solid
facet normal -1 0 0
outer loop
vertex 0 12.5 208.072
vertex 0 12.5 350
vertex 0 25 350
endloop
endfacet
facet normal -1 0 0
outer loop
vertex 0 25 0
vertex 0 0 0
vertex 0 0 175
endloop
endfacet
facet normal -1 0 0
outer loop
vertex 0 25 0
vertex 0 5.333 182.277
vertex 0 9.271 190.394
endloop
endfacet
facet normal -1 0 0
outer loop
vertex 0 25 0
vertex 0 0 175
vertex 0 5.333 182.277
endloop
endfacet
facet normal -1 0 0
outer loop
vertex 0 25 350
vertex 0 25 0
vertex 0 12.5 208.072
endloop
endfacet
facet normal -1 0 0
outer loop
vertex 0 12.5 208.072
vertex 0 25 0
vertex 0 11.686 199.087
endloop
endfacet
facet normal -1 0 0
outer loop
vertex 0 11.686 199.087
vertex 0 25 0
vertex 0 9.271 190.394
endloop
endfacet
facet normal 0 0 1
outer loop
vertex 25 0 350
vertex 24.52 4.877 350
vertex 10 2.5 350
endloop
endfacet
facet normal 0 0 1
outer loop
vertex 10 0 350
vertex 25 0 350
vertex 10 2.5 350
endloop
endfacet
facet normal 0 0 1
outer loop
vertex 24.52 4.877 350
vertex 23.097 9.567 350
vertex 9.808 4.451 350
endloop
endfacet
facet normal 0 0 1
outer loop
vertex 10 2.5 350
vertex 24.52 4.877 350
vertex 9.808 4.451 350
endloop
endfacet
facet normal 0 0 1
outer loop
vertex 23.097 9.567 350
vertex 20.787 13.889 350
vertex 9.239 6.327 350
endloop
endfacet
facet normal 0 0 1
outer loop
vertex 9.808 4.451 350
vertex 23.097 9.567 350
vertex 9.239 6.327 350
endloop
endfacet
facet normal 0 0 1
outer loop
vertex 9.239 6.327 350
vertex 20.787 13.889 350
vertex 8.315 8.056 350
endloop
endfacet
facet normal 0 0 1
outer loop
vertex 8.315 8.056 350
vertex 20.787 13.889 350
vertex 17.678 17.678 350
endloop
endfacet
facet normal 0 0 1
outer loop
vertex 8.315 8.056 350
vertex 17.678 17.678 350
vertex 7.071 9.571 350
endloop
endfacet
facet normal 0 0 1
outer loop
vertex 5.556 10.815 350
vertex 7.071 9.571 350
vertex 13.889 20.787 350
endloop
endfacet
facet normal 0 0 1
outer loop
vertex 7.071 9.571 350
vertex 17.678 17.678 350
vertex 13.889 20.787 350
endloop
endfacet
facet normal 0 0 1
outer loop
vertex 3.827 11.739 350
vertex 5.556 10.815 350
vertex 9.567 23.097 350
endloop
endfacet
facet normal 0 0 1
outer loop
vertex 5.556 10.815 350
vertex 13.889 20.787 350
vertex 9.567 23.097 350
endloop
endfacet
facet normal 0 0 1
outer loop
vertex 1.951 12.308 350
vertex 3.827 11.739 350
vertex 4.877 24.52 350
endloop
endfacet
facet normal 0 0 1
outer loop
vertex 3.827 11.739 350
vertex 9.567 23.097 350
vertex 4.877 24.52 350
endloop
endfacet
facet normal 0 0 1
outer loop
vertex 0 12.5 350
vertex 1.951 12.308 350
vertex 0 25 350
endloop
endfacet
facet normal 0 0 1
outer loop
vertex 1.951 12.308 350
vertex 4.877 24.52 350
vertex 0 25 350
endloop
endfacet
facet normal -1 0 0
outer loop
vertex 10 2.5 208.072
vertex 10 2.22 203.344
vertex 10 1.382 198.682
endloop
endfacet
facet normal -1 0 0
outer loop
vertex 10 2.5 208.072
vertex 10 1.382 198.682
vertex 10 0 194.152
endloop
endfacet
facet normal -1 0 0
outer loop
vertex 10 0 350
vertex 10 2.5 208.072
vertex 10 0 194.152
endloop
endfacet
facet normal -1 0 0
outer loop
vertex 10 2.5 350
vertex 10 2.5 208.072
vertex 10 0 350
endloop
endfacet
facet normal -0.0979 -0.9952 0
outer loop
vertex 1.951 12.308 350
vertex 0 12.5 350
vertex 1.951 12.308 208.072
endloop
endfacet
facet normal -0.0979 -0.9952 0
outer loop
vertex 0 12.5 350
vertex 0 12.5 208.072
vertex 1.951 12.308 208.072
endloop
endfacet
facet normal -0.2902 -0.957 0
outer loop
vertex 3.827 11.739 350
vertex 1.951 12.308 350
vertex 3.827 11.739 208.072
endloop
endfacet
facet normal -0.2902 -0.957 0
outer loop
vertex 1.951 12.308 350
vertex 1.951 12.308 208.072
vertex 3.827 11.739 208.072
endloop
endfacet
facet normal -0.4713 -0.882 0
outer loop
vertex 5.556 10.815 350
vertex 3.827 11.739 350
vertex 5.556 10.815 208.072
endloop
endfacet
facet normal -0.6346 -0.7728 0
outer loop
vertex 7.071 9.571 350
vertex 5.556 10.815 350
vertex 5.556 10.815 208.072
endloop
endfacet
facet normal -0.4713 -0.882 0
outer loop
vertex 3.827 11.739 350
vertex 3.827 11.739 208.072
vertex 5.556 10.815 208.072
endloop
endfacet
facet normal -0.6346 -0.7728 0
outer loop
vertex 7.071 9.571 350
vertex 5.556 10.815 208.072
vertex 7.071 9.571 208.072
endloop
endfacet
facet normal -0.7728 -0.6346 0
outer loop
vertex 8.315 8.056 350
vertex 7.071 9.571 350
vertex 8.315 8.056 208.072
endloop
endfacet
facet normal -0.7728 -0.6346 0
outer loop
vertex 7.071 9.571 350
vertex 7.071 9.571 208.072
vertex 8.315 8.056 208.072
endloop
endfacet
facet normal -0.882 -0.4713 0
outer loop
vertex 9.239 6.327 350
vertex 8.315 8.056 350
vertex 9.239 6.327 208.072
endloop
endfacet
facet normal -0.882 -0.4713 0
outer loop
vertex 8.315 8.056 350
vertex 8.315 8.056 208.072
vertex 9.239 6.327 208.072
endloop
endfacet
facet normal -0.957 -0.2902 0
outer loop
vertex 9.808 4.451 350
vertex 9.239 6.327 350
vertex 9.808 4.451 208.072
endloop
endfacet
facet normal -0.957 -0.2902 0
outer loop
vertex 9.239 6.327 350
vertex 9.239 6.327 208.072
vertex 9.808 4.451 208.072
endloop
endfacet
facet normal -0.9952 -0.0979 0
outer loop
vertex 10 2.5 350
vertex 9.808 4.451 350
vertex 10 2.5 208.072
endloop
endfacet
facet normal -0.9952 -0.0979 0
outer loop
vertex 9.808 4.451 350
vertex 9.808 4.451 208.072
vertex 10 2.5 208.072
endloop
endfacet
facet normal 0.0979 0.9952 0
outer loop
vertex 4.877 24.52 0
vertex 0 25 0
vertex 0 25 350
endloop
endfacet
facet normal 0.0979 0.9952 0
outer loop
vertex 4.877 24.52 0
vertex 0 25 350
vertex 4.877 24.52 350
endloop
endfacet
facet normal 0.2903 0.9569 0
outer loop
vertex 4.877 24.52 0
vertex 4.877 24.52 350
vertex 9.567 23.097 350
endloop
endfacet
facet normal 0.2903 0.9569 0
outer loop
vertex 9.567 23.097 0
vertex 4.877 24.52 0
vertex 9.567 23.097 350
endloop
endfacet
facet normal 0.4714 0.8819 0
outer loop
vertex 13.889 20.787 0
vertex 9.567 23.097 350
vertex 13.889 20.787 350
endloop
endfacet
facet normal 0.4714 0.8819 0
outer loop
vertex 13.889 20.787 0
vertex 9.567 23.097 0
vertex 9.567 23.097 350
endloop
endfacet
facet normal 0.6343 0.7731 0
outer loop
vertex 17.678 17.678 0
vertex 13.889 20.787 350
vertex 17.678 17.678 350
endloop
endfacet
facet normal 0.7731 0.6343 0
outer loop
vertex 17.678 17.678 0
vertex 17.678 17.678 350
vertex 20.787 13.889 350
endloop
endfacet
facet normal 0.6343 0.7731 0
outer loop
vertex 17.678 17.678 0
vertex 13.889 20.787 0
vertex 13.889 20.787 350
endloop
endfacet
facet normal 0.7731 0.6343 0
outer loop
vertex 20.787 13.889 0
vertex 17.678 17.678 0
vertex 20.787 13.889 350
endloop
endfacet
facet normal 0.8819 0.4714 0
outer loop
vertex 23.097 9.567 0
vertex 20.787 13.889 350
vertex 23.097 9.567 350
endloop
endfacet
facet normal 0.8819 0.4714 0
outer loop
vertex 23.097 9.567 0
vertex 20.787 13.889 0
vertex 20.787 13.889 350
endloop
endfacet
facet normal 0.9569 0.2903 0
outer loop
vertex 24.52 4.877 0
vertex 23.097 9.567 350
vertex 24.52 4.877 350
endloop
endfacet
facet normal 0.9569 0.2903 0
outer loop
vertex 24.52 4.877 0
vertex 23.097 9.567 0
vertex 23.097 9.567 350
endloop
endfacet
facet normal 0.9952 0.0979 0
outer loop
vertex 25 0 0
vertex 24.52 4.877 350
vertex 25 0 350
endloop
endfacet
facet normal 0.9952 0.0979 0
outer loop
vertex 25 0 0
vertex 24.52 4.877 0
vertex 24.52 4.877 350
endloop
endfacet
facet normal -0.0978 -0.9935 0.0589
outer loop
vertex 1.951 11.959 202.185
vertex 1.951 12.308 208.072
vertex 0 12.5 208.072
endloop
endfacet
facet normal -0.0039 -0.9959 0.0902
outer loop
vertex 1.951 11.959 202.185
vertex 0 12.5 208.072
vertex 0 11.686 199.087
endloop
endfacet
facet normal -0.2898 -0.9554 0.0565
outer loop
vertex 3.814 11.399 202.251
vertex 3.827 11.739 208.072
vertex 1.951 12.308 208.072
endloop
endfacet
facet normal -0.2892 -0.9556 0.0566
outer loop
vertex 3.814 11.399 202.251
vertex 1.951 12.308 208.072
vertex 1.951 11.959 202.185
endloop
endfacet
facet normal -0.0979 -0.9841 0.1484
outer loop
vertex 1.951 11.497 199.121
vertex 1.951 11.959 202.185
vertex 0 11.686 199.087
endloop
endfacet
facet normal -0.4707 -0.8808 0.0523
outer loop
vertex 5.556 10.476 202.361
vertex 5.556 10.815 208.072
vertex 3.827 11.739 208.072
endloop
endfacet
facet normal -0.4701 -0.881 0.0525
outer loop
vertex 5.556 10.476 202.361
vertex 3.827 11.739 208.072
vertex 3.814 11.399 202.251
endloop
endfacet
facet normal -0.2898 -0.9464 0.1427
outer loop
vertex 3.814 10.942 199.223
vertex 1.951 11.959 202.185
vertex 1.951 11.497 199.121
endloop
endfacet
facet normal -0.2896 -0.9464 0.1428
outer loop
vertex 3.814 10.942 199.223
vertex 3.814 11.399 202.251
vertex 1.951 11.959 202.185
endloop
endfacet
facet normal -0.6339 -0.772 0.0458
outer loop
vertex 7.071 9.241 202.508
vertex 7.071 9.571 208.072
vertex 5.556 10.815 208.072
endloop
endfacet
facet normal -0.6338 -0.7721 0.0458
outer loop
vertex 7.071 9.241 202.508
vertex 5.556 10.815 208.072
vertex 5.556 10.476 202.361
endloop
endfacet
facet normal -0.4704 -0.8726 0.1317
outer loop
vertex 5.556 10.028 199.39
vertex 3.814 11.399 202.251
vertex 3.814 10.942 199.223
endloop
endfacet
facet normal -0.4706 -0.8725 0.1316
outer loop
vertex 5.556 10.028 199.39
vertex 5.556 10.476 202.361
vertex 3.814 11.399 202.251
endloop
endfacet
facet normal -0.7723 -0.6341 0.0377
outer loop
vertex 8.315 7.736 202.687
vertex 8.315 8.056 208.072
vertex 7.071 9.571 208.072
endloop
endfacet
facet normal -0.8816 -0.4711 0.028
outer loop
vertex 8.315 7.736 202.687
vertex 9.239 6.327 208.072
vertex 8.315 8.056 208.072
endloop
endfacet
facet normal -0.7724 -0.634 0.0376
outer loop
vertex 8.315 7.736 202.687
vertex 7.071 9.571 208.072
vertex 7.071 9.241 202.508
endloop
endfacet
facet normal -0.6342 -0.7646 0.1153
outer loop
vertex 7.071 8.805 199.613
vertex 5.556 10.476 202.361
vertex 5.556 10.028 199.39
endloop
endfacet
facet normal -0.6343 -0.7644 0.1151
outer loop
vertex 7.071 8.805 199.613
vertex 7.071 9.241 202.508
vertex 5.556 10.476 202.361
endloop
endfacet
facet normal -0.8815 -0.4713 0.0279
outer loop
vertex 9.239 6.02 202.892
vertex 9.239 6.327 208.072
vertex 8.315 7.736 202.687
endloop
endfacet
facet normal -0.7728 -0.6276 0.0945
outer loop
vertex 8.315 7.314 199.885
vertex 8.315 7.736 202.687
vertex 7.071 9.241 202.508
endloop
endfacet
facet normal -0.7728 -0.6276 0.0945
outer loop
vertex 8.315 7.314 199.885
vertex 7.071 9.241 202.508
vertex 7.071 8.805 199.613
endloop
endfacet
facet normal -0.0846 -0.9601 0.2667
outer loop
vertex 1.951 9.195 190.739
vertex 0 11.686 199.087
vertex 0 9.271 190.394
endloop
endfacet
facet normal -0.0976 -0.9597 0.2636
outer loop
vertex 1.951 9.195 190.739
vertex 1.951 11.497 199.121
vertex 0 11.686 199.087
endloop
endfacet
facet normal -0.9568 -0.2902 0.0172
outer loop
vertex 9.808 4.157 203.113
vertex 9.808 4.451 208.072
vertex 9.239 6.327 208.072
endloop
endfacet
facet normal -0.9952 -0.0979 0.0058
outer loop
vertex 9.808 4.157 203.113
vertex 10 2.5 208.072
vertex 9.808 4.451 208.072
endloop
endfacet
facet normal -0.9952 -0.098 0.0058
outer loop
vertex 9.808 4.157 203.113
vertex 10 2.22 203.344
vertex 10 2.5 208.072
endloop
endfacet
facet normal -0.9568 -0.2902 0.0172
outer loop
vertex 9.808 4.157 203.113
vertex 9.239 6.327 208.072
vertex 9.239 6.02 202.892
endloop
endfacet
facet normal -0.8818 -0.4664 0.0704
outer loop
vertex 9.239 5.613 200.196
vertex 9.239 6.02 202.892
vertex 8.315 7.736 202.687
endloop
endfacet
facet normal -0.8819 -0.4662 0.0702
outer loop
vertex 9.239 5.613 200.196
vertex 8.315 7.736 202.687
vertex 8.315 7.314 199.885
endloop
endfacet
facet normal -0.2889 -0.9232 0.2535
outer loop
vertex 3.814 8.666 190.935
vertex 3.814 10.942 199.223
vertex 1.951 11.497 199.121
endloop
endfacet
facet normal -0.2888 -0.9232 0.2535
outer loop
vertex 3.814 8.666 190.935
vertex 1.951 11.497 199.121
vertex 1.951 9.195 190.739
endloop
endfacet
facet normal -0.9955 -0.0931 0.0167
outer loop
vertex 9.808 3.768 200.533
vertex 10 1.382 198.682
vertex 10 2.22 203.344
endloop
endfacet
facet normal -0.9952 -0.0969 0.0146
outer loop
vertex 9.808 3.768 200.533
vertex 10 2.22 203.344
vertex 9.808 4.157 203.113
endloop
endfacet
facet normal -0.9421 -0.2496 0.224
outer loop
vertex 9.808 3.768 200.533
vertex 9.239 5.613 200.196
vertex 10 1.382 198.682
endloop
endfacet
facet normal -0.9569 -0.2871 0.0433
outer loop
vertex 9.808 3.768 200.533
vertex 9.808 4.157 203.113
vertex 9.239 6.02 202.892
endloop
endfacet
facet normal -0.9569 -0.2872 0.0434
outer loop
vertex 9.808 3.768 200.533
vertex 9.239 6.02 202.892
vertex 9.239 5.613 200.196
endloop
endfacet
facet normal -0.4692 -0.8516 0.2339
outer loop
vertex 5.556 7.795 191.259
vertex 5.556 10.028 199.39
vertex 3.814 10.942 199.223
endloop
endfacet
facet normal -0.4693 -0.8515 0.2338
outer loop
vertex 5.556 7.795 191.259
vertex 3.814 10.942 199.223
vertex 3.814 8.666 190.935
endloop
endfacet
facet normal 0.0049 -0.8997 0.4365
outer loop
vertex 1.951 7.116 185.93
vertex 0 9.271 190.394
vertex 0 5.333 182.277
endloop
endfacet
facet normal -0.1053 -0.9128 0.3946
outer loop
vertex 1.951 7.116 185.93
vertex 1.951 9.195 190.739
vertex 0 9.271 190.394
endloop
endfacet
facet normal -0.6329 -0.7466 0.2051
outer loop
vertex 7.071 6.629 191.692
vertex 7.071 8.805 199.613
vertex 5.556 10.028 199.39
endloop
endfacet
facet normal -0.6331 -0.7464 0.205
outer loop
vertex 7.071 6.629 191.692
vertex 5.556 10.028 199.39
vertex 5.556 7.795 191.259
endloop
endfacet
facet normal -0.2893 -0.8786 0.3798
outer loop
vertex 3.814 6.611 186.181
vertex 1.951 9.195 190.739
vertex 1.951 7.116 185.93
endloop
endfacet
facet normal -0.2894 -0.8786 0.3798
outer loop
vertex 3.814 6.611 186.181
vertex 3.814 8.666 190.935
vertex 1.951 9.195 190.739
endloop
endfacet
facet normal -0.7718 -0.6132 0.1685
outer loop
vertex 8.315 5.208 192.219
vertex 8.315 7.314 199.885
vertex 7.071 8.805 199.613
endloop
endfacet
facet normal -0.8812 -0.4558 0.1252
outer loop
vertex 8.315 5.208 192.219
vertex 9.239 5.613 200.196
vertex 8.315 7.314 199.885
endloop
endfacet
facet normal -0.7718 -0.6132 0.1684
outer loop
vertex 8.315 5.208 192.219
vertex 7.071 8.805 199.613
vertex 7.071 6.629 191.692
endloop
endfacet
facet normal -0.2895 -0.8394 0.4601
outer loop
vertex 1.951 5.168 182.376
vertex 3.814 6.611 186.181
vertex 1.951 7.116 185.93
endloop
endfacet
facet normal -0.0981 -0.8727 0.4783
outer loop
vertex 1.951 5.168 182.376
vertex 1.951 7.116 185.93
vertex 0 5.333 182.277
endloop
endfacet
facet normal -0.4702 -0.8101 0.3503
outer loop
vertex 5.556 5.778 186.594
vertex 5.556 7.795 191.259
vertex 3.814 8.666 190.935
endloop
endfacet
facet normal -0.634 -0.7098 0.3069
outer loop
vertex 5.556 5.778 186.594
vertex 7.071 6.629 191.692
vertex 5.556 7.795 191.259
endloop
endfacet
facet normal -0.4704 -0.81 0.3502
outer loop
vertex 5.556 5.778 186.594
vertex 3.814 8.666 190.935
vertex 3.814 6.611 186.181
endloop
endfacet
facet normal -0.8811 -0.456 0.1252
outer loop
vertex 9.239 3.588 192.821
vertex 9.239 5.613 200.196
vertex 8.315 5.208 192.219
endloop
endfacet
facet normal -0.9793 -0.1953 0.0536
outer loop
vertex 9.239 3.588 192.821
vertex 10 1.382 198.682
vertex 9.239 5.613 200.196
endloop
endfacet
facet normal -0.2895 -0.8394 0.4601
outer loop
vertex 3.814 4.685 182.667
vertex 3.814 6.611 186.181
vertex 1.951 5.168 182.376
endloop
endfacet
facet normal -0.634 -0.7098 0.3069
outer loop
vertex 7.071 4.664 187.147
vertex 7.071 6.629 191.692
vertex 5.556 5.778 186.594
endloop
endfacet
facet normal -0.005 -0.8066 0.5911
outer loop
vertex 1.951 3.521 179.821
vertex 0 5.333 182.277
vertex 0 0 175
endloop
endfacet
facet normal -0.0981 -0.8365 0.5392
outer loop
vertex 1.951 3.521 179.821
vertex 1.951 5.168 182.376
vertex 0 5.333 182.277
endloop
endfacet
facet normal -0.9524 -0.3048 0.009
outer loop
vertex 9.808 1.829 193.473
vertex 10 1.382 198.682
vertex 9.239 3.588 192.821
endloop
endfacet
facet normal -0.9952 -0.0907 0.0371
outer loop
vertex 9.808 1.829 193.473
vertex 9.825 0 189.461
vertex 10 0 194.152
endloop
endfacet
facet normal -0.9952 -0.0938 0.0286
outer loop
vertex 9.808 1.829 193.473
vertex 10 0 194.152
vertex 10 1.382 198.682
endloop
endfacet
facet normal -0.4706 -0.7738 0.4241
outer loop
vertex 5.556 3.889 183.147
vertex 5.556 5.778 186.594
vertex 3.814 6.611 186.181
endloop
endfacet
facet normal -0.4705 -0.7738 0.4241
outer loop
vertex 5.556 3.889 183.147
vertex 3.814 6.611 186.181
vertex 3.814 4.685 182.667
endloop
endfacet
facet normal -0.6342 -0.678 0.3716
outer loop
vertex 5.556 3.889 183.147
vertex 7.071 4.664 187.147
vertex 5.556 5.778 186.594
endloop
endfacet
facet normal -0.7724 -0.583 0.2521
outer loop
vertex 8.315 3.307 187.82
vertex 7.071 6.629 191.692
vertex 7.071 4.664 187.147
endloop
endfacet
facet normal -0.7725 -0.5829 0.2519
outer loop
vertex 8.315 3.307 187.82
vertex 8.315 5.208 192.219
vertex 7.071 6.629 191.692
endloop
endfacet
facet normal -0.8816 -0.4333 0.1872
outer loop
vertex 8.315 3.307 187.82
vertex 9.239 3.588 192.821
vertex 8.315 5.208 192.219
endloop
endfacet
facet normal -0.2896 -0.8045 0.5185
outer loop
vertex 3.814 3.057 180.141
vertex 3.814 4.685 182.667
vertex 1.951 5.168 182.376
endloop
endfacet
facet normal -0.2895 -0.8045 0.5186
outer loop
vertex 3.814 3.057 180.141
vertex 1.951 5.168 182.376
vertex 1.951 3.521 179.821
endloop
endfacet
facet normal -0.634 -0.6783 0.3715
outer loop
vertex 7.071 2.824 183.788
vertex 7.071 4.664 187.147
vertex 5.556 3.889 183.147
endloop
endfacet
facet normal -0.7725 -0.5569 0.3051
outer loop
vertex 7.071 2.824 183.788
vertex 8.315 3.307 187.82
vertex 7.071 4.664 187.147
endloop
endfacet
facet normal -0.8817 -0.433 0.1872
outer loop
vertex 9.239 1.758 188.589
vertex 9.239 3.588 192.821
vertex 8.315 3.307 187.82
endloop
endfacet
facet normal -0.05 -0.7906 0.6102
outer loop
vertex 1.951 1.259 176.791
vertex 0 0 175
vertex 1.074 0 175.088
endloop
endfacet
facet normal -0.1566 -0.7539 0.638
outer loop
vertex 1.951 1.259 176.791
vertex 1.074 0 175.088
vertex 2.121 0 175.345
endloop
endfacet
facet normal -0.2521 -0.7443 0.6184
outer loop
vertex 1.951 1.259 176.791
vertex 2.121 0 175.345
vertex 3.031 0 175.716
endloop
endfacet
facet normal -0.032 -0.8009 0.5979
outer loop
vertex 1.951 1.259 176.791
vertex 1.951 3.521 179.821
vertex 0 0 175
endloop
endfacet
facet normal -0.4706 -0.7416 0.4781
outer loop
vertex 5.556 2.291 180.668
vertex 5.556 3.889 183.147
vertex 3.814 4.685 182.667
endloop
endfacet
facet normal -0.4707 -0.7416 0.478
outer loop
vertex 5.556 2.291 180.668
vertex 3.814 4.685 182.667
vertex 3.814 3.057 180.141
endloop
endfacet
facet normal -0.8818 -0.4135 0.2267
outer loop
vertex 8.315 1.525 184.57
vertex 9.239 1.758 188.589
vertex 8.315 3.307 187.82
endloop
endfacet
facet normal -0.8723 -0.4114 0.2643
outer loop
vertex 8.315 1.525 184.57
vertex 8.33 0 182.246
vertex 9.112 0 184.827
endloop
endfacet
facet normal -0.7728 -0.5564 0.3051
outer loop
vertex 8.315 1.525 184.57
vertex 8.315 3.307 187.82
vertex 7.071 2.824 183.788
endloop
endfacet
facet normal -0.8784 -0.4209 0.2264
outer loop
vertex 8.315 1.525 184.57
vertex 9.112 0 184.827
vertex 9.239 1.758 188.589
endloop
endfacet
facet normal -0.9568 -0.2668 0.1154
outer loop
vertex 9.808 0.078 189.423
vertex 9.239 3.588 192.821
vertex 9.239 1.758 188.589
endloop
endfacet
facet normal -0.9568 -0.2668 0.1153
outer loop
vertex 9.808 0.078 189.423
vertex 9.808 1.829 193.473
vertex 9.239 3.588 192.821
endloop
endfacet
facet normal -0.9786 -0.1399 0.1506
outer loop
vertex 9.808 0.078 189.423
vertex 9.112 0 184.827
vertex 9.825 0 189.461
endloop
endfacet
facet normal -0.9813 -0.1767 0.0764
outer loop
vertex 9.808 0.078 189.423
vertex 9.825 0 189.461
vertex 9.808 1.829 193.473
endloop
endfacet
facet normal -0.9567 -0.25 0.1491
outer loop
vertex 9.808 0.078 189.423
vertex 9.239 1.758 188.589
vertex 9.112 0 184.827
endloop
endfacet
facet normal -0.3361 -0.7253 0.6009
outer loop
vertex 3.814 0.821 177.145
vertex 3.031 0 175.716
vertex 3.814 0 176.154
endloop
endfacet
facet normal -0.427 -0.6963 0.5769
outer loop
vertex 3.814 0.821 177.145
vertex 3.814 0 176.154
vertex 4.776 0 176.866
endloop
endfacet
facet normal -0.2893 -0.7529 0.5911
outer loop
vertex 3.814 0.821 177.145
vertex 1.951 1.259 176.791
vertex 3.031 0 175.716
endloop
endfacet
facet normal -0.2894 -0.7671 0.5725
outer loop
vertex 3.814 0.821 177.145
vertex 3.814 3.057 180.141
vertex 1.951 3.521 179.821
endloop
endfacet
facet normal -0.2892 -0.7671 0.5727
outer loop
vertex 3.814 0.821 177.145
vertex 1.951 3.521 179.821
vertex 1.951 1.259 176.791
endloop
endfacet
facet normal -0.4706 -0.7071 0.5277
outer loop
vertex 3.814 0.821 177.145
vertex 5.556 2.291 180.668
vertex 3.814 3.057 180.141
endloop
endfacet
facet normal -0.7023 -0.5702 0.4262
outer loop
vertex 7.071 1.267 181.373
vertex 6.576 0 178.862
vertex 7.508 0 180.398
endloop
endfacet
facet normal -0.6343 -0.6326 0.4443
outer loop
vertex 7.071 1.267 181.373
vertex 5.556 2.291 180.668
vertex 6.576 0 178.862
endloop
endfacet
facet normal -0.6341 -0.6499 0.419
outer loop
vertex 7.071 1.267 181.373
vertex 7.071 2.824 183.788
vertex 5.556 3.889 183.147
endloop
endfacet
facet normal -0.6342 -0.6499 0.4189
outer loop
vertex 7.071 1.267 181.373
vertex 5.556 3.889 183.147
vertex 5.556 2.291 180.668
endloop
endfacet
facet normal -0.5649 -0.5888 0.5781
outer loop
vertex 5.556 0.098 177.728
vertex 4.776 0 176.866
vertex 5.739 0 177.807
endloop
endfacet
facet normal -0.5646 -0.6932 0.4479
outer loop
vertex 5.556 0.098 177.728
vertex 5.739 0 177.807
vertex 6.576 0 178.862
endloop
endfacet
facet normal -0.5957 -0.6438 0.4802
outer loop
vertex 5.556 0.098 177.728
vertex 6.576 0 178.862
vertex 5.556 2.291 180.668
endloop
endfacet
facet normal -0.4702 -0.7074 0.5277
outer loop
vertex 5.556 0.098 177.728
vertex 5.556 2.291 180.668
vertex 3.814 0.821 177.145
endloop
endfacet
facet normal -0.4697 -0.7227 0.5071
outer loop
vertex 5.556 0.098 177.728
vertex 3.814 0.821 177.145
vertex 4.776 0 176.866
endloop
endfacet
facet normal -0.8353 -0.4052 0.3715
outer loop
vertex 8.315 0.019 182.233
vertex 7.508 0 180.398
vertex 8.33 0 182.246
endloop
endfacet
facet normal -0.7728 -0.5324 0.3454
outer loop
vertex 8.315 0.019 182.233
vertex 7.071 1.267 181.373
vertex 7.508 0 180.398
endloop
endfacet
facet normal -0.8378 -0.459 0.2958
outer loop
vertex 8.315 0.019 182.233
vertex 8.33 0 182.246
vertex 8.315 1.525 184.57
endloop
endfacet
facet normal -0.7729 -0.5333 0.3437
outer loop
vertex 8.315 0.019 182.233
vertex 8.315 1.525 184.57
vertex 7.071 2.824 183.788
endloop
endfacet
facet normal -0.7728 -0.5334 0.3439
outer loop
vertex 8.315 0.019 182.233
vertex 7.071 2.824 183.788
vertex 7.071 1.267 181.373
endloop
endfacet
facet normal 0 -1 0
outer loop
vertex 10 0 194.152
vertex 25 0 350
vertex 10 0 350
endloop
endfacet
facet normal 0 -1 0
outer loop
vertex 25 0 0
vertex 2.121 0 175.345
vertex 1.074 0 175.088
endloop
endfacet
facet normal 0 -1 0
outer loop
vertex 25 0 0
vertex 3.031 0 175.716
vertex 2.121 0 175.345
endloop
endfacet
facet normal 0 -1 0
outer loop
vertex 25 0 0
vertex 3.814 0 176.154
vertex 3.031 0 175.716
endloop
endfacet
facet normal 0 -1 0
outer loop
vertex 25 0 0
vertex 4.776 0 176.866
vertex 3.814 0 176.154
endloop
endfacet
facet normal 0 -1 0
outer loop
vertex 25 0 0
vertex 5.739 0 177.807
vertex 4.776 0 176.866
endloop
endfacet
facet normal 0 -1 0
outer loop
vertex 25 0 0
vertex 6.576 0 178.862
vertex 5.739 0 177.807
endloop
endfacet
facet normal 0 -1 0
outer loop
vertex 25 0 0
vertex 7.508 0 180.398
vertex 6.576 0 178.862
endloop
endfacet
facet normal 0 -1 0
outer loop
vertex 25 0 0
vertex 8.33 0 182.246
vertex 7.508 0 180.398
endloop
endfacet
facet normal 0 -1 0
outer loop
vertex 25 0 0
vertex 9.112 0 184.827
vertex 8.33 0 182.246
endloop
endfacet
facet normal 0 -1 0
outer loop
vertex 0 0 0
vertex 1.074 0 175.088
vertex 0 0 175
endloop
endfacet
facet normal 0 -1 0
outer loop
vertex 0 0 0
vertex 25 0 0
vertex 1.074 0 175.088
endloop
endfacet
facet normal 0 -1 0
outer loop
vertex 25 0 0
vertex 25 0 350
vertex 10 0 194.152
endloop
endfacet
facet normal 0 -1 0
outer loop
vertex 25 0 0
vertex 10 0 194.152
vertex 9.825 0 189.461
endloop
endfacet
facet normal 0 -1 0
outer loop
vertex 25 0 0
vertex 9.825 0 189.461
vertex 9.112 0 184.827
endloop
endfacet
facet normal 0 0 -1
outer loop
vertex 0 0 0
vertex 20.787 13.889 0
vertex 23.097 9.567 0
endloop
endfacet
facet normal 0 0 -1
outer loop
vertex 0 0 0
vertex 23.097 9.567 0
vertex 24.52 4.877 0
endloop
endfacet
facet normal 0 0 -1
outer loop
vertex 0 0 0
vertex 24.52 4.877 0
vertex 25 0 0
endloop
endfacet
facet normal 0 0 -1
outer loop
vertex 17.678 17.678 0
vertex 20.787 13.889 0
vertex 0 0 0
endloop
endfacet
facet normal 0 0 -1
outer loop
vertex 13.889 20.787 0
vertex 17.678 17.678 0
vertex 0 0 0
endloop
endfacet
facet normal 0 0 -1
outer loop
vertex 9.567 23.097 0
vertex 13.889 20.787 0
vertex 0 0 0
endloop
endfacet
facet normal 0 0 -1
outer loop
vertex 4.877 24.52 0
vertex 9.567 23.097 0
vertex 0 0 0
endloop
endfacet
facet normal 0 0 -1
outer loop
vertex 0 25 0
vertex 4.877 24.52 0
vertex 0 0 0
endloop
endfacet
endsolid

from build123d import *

# Parameters (mm, degrees)
BOSS_EXTRUDE1_DEPTH = 350
CUT_EXTRUDE1_DEPTH  = 10
FILLET1_R           = 10


with BuildPart() as part:
    # Sketch1 → Boss-Extrude1 (new body)
    with BuildSketch(Plane.XY):
        with BuildLine():
            Line((0, 0), (0, 25))
            ThreePointArc((0, 25), (17.67766953, 17.67766953), (25, 0))
            Line((25, 0), (0, 0))
        make_face()
    extrude(amount=BOSS_EXTRUDE1_DEPTH)

    # Sketch2 → Cut-Extrude1 (cut)
    with BuildSketch(Plane.ZY):
        with BuildLine():
            Line((350, 0), (350, 12.5))
            Line((350, 12.5), (208.071891388, 12.5))
            ThreePointArc((208.071891388, 12.5), (190.394221859, 9.270717335), (175, 0))
            Line((175, 0), (350, 0))
        make_face()
    extrude(amount=-CUT_EXTRUDE1_DEPTH, mode=Mode.SUBTRACT)

    # Fillet1
    fillet1_edges = [part.edges().sort_by_distance(p)[0] for p in [
        (10, 12.5, 279.035945694),
        (10, 9.270717335, 190.394221859),
    ]]
    fillet(fillet1_edges, radius=FILLET1_R - 0.0001)  # a hair under: the kernel refuses the full size


solid = part.part
